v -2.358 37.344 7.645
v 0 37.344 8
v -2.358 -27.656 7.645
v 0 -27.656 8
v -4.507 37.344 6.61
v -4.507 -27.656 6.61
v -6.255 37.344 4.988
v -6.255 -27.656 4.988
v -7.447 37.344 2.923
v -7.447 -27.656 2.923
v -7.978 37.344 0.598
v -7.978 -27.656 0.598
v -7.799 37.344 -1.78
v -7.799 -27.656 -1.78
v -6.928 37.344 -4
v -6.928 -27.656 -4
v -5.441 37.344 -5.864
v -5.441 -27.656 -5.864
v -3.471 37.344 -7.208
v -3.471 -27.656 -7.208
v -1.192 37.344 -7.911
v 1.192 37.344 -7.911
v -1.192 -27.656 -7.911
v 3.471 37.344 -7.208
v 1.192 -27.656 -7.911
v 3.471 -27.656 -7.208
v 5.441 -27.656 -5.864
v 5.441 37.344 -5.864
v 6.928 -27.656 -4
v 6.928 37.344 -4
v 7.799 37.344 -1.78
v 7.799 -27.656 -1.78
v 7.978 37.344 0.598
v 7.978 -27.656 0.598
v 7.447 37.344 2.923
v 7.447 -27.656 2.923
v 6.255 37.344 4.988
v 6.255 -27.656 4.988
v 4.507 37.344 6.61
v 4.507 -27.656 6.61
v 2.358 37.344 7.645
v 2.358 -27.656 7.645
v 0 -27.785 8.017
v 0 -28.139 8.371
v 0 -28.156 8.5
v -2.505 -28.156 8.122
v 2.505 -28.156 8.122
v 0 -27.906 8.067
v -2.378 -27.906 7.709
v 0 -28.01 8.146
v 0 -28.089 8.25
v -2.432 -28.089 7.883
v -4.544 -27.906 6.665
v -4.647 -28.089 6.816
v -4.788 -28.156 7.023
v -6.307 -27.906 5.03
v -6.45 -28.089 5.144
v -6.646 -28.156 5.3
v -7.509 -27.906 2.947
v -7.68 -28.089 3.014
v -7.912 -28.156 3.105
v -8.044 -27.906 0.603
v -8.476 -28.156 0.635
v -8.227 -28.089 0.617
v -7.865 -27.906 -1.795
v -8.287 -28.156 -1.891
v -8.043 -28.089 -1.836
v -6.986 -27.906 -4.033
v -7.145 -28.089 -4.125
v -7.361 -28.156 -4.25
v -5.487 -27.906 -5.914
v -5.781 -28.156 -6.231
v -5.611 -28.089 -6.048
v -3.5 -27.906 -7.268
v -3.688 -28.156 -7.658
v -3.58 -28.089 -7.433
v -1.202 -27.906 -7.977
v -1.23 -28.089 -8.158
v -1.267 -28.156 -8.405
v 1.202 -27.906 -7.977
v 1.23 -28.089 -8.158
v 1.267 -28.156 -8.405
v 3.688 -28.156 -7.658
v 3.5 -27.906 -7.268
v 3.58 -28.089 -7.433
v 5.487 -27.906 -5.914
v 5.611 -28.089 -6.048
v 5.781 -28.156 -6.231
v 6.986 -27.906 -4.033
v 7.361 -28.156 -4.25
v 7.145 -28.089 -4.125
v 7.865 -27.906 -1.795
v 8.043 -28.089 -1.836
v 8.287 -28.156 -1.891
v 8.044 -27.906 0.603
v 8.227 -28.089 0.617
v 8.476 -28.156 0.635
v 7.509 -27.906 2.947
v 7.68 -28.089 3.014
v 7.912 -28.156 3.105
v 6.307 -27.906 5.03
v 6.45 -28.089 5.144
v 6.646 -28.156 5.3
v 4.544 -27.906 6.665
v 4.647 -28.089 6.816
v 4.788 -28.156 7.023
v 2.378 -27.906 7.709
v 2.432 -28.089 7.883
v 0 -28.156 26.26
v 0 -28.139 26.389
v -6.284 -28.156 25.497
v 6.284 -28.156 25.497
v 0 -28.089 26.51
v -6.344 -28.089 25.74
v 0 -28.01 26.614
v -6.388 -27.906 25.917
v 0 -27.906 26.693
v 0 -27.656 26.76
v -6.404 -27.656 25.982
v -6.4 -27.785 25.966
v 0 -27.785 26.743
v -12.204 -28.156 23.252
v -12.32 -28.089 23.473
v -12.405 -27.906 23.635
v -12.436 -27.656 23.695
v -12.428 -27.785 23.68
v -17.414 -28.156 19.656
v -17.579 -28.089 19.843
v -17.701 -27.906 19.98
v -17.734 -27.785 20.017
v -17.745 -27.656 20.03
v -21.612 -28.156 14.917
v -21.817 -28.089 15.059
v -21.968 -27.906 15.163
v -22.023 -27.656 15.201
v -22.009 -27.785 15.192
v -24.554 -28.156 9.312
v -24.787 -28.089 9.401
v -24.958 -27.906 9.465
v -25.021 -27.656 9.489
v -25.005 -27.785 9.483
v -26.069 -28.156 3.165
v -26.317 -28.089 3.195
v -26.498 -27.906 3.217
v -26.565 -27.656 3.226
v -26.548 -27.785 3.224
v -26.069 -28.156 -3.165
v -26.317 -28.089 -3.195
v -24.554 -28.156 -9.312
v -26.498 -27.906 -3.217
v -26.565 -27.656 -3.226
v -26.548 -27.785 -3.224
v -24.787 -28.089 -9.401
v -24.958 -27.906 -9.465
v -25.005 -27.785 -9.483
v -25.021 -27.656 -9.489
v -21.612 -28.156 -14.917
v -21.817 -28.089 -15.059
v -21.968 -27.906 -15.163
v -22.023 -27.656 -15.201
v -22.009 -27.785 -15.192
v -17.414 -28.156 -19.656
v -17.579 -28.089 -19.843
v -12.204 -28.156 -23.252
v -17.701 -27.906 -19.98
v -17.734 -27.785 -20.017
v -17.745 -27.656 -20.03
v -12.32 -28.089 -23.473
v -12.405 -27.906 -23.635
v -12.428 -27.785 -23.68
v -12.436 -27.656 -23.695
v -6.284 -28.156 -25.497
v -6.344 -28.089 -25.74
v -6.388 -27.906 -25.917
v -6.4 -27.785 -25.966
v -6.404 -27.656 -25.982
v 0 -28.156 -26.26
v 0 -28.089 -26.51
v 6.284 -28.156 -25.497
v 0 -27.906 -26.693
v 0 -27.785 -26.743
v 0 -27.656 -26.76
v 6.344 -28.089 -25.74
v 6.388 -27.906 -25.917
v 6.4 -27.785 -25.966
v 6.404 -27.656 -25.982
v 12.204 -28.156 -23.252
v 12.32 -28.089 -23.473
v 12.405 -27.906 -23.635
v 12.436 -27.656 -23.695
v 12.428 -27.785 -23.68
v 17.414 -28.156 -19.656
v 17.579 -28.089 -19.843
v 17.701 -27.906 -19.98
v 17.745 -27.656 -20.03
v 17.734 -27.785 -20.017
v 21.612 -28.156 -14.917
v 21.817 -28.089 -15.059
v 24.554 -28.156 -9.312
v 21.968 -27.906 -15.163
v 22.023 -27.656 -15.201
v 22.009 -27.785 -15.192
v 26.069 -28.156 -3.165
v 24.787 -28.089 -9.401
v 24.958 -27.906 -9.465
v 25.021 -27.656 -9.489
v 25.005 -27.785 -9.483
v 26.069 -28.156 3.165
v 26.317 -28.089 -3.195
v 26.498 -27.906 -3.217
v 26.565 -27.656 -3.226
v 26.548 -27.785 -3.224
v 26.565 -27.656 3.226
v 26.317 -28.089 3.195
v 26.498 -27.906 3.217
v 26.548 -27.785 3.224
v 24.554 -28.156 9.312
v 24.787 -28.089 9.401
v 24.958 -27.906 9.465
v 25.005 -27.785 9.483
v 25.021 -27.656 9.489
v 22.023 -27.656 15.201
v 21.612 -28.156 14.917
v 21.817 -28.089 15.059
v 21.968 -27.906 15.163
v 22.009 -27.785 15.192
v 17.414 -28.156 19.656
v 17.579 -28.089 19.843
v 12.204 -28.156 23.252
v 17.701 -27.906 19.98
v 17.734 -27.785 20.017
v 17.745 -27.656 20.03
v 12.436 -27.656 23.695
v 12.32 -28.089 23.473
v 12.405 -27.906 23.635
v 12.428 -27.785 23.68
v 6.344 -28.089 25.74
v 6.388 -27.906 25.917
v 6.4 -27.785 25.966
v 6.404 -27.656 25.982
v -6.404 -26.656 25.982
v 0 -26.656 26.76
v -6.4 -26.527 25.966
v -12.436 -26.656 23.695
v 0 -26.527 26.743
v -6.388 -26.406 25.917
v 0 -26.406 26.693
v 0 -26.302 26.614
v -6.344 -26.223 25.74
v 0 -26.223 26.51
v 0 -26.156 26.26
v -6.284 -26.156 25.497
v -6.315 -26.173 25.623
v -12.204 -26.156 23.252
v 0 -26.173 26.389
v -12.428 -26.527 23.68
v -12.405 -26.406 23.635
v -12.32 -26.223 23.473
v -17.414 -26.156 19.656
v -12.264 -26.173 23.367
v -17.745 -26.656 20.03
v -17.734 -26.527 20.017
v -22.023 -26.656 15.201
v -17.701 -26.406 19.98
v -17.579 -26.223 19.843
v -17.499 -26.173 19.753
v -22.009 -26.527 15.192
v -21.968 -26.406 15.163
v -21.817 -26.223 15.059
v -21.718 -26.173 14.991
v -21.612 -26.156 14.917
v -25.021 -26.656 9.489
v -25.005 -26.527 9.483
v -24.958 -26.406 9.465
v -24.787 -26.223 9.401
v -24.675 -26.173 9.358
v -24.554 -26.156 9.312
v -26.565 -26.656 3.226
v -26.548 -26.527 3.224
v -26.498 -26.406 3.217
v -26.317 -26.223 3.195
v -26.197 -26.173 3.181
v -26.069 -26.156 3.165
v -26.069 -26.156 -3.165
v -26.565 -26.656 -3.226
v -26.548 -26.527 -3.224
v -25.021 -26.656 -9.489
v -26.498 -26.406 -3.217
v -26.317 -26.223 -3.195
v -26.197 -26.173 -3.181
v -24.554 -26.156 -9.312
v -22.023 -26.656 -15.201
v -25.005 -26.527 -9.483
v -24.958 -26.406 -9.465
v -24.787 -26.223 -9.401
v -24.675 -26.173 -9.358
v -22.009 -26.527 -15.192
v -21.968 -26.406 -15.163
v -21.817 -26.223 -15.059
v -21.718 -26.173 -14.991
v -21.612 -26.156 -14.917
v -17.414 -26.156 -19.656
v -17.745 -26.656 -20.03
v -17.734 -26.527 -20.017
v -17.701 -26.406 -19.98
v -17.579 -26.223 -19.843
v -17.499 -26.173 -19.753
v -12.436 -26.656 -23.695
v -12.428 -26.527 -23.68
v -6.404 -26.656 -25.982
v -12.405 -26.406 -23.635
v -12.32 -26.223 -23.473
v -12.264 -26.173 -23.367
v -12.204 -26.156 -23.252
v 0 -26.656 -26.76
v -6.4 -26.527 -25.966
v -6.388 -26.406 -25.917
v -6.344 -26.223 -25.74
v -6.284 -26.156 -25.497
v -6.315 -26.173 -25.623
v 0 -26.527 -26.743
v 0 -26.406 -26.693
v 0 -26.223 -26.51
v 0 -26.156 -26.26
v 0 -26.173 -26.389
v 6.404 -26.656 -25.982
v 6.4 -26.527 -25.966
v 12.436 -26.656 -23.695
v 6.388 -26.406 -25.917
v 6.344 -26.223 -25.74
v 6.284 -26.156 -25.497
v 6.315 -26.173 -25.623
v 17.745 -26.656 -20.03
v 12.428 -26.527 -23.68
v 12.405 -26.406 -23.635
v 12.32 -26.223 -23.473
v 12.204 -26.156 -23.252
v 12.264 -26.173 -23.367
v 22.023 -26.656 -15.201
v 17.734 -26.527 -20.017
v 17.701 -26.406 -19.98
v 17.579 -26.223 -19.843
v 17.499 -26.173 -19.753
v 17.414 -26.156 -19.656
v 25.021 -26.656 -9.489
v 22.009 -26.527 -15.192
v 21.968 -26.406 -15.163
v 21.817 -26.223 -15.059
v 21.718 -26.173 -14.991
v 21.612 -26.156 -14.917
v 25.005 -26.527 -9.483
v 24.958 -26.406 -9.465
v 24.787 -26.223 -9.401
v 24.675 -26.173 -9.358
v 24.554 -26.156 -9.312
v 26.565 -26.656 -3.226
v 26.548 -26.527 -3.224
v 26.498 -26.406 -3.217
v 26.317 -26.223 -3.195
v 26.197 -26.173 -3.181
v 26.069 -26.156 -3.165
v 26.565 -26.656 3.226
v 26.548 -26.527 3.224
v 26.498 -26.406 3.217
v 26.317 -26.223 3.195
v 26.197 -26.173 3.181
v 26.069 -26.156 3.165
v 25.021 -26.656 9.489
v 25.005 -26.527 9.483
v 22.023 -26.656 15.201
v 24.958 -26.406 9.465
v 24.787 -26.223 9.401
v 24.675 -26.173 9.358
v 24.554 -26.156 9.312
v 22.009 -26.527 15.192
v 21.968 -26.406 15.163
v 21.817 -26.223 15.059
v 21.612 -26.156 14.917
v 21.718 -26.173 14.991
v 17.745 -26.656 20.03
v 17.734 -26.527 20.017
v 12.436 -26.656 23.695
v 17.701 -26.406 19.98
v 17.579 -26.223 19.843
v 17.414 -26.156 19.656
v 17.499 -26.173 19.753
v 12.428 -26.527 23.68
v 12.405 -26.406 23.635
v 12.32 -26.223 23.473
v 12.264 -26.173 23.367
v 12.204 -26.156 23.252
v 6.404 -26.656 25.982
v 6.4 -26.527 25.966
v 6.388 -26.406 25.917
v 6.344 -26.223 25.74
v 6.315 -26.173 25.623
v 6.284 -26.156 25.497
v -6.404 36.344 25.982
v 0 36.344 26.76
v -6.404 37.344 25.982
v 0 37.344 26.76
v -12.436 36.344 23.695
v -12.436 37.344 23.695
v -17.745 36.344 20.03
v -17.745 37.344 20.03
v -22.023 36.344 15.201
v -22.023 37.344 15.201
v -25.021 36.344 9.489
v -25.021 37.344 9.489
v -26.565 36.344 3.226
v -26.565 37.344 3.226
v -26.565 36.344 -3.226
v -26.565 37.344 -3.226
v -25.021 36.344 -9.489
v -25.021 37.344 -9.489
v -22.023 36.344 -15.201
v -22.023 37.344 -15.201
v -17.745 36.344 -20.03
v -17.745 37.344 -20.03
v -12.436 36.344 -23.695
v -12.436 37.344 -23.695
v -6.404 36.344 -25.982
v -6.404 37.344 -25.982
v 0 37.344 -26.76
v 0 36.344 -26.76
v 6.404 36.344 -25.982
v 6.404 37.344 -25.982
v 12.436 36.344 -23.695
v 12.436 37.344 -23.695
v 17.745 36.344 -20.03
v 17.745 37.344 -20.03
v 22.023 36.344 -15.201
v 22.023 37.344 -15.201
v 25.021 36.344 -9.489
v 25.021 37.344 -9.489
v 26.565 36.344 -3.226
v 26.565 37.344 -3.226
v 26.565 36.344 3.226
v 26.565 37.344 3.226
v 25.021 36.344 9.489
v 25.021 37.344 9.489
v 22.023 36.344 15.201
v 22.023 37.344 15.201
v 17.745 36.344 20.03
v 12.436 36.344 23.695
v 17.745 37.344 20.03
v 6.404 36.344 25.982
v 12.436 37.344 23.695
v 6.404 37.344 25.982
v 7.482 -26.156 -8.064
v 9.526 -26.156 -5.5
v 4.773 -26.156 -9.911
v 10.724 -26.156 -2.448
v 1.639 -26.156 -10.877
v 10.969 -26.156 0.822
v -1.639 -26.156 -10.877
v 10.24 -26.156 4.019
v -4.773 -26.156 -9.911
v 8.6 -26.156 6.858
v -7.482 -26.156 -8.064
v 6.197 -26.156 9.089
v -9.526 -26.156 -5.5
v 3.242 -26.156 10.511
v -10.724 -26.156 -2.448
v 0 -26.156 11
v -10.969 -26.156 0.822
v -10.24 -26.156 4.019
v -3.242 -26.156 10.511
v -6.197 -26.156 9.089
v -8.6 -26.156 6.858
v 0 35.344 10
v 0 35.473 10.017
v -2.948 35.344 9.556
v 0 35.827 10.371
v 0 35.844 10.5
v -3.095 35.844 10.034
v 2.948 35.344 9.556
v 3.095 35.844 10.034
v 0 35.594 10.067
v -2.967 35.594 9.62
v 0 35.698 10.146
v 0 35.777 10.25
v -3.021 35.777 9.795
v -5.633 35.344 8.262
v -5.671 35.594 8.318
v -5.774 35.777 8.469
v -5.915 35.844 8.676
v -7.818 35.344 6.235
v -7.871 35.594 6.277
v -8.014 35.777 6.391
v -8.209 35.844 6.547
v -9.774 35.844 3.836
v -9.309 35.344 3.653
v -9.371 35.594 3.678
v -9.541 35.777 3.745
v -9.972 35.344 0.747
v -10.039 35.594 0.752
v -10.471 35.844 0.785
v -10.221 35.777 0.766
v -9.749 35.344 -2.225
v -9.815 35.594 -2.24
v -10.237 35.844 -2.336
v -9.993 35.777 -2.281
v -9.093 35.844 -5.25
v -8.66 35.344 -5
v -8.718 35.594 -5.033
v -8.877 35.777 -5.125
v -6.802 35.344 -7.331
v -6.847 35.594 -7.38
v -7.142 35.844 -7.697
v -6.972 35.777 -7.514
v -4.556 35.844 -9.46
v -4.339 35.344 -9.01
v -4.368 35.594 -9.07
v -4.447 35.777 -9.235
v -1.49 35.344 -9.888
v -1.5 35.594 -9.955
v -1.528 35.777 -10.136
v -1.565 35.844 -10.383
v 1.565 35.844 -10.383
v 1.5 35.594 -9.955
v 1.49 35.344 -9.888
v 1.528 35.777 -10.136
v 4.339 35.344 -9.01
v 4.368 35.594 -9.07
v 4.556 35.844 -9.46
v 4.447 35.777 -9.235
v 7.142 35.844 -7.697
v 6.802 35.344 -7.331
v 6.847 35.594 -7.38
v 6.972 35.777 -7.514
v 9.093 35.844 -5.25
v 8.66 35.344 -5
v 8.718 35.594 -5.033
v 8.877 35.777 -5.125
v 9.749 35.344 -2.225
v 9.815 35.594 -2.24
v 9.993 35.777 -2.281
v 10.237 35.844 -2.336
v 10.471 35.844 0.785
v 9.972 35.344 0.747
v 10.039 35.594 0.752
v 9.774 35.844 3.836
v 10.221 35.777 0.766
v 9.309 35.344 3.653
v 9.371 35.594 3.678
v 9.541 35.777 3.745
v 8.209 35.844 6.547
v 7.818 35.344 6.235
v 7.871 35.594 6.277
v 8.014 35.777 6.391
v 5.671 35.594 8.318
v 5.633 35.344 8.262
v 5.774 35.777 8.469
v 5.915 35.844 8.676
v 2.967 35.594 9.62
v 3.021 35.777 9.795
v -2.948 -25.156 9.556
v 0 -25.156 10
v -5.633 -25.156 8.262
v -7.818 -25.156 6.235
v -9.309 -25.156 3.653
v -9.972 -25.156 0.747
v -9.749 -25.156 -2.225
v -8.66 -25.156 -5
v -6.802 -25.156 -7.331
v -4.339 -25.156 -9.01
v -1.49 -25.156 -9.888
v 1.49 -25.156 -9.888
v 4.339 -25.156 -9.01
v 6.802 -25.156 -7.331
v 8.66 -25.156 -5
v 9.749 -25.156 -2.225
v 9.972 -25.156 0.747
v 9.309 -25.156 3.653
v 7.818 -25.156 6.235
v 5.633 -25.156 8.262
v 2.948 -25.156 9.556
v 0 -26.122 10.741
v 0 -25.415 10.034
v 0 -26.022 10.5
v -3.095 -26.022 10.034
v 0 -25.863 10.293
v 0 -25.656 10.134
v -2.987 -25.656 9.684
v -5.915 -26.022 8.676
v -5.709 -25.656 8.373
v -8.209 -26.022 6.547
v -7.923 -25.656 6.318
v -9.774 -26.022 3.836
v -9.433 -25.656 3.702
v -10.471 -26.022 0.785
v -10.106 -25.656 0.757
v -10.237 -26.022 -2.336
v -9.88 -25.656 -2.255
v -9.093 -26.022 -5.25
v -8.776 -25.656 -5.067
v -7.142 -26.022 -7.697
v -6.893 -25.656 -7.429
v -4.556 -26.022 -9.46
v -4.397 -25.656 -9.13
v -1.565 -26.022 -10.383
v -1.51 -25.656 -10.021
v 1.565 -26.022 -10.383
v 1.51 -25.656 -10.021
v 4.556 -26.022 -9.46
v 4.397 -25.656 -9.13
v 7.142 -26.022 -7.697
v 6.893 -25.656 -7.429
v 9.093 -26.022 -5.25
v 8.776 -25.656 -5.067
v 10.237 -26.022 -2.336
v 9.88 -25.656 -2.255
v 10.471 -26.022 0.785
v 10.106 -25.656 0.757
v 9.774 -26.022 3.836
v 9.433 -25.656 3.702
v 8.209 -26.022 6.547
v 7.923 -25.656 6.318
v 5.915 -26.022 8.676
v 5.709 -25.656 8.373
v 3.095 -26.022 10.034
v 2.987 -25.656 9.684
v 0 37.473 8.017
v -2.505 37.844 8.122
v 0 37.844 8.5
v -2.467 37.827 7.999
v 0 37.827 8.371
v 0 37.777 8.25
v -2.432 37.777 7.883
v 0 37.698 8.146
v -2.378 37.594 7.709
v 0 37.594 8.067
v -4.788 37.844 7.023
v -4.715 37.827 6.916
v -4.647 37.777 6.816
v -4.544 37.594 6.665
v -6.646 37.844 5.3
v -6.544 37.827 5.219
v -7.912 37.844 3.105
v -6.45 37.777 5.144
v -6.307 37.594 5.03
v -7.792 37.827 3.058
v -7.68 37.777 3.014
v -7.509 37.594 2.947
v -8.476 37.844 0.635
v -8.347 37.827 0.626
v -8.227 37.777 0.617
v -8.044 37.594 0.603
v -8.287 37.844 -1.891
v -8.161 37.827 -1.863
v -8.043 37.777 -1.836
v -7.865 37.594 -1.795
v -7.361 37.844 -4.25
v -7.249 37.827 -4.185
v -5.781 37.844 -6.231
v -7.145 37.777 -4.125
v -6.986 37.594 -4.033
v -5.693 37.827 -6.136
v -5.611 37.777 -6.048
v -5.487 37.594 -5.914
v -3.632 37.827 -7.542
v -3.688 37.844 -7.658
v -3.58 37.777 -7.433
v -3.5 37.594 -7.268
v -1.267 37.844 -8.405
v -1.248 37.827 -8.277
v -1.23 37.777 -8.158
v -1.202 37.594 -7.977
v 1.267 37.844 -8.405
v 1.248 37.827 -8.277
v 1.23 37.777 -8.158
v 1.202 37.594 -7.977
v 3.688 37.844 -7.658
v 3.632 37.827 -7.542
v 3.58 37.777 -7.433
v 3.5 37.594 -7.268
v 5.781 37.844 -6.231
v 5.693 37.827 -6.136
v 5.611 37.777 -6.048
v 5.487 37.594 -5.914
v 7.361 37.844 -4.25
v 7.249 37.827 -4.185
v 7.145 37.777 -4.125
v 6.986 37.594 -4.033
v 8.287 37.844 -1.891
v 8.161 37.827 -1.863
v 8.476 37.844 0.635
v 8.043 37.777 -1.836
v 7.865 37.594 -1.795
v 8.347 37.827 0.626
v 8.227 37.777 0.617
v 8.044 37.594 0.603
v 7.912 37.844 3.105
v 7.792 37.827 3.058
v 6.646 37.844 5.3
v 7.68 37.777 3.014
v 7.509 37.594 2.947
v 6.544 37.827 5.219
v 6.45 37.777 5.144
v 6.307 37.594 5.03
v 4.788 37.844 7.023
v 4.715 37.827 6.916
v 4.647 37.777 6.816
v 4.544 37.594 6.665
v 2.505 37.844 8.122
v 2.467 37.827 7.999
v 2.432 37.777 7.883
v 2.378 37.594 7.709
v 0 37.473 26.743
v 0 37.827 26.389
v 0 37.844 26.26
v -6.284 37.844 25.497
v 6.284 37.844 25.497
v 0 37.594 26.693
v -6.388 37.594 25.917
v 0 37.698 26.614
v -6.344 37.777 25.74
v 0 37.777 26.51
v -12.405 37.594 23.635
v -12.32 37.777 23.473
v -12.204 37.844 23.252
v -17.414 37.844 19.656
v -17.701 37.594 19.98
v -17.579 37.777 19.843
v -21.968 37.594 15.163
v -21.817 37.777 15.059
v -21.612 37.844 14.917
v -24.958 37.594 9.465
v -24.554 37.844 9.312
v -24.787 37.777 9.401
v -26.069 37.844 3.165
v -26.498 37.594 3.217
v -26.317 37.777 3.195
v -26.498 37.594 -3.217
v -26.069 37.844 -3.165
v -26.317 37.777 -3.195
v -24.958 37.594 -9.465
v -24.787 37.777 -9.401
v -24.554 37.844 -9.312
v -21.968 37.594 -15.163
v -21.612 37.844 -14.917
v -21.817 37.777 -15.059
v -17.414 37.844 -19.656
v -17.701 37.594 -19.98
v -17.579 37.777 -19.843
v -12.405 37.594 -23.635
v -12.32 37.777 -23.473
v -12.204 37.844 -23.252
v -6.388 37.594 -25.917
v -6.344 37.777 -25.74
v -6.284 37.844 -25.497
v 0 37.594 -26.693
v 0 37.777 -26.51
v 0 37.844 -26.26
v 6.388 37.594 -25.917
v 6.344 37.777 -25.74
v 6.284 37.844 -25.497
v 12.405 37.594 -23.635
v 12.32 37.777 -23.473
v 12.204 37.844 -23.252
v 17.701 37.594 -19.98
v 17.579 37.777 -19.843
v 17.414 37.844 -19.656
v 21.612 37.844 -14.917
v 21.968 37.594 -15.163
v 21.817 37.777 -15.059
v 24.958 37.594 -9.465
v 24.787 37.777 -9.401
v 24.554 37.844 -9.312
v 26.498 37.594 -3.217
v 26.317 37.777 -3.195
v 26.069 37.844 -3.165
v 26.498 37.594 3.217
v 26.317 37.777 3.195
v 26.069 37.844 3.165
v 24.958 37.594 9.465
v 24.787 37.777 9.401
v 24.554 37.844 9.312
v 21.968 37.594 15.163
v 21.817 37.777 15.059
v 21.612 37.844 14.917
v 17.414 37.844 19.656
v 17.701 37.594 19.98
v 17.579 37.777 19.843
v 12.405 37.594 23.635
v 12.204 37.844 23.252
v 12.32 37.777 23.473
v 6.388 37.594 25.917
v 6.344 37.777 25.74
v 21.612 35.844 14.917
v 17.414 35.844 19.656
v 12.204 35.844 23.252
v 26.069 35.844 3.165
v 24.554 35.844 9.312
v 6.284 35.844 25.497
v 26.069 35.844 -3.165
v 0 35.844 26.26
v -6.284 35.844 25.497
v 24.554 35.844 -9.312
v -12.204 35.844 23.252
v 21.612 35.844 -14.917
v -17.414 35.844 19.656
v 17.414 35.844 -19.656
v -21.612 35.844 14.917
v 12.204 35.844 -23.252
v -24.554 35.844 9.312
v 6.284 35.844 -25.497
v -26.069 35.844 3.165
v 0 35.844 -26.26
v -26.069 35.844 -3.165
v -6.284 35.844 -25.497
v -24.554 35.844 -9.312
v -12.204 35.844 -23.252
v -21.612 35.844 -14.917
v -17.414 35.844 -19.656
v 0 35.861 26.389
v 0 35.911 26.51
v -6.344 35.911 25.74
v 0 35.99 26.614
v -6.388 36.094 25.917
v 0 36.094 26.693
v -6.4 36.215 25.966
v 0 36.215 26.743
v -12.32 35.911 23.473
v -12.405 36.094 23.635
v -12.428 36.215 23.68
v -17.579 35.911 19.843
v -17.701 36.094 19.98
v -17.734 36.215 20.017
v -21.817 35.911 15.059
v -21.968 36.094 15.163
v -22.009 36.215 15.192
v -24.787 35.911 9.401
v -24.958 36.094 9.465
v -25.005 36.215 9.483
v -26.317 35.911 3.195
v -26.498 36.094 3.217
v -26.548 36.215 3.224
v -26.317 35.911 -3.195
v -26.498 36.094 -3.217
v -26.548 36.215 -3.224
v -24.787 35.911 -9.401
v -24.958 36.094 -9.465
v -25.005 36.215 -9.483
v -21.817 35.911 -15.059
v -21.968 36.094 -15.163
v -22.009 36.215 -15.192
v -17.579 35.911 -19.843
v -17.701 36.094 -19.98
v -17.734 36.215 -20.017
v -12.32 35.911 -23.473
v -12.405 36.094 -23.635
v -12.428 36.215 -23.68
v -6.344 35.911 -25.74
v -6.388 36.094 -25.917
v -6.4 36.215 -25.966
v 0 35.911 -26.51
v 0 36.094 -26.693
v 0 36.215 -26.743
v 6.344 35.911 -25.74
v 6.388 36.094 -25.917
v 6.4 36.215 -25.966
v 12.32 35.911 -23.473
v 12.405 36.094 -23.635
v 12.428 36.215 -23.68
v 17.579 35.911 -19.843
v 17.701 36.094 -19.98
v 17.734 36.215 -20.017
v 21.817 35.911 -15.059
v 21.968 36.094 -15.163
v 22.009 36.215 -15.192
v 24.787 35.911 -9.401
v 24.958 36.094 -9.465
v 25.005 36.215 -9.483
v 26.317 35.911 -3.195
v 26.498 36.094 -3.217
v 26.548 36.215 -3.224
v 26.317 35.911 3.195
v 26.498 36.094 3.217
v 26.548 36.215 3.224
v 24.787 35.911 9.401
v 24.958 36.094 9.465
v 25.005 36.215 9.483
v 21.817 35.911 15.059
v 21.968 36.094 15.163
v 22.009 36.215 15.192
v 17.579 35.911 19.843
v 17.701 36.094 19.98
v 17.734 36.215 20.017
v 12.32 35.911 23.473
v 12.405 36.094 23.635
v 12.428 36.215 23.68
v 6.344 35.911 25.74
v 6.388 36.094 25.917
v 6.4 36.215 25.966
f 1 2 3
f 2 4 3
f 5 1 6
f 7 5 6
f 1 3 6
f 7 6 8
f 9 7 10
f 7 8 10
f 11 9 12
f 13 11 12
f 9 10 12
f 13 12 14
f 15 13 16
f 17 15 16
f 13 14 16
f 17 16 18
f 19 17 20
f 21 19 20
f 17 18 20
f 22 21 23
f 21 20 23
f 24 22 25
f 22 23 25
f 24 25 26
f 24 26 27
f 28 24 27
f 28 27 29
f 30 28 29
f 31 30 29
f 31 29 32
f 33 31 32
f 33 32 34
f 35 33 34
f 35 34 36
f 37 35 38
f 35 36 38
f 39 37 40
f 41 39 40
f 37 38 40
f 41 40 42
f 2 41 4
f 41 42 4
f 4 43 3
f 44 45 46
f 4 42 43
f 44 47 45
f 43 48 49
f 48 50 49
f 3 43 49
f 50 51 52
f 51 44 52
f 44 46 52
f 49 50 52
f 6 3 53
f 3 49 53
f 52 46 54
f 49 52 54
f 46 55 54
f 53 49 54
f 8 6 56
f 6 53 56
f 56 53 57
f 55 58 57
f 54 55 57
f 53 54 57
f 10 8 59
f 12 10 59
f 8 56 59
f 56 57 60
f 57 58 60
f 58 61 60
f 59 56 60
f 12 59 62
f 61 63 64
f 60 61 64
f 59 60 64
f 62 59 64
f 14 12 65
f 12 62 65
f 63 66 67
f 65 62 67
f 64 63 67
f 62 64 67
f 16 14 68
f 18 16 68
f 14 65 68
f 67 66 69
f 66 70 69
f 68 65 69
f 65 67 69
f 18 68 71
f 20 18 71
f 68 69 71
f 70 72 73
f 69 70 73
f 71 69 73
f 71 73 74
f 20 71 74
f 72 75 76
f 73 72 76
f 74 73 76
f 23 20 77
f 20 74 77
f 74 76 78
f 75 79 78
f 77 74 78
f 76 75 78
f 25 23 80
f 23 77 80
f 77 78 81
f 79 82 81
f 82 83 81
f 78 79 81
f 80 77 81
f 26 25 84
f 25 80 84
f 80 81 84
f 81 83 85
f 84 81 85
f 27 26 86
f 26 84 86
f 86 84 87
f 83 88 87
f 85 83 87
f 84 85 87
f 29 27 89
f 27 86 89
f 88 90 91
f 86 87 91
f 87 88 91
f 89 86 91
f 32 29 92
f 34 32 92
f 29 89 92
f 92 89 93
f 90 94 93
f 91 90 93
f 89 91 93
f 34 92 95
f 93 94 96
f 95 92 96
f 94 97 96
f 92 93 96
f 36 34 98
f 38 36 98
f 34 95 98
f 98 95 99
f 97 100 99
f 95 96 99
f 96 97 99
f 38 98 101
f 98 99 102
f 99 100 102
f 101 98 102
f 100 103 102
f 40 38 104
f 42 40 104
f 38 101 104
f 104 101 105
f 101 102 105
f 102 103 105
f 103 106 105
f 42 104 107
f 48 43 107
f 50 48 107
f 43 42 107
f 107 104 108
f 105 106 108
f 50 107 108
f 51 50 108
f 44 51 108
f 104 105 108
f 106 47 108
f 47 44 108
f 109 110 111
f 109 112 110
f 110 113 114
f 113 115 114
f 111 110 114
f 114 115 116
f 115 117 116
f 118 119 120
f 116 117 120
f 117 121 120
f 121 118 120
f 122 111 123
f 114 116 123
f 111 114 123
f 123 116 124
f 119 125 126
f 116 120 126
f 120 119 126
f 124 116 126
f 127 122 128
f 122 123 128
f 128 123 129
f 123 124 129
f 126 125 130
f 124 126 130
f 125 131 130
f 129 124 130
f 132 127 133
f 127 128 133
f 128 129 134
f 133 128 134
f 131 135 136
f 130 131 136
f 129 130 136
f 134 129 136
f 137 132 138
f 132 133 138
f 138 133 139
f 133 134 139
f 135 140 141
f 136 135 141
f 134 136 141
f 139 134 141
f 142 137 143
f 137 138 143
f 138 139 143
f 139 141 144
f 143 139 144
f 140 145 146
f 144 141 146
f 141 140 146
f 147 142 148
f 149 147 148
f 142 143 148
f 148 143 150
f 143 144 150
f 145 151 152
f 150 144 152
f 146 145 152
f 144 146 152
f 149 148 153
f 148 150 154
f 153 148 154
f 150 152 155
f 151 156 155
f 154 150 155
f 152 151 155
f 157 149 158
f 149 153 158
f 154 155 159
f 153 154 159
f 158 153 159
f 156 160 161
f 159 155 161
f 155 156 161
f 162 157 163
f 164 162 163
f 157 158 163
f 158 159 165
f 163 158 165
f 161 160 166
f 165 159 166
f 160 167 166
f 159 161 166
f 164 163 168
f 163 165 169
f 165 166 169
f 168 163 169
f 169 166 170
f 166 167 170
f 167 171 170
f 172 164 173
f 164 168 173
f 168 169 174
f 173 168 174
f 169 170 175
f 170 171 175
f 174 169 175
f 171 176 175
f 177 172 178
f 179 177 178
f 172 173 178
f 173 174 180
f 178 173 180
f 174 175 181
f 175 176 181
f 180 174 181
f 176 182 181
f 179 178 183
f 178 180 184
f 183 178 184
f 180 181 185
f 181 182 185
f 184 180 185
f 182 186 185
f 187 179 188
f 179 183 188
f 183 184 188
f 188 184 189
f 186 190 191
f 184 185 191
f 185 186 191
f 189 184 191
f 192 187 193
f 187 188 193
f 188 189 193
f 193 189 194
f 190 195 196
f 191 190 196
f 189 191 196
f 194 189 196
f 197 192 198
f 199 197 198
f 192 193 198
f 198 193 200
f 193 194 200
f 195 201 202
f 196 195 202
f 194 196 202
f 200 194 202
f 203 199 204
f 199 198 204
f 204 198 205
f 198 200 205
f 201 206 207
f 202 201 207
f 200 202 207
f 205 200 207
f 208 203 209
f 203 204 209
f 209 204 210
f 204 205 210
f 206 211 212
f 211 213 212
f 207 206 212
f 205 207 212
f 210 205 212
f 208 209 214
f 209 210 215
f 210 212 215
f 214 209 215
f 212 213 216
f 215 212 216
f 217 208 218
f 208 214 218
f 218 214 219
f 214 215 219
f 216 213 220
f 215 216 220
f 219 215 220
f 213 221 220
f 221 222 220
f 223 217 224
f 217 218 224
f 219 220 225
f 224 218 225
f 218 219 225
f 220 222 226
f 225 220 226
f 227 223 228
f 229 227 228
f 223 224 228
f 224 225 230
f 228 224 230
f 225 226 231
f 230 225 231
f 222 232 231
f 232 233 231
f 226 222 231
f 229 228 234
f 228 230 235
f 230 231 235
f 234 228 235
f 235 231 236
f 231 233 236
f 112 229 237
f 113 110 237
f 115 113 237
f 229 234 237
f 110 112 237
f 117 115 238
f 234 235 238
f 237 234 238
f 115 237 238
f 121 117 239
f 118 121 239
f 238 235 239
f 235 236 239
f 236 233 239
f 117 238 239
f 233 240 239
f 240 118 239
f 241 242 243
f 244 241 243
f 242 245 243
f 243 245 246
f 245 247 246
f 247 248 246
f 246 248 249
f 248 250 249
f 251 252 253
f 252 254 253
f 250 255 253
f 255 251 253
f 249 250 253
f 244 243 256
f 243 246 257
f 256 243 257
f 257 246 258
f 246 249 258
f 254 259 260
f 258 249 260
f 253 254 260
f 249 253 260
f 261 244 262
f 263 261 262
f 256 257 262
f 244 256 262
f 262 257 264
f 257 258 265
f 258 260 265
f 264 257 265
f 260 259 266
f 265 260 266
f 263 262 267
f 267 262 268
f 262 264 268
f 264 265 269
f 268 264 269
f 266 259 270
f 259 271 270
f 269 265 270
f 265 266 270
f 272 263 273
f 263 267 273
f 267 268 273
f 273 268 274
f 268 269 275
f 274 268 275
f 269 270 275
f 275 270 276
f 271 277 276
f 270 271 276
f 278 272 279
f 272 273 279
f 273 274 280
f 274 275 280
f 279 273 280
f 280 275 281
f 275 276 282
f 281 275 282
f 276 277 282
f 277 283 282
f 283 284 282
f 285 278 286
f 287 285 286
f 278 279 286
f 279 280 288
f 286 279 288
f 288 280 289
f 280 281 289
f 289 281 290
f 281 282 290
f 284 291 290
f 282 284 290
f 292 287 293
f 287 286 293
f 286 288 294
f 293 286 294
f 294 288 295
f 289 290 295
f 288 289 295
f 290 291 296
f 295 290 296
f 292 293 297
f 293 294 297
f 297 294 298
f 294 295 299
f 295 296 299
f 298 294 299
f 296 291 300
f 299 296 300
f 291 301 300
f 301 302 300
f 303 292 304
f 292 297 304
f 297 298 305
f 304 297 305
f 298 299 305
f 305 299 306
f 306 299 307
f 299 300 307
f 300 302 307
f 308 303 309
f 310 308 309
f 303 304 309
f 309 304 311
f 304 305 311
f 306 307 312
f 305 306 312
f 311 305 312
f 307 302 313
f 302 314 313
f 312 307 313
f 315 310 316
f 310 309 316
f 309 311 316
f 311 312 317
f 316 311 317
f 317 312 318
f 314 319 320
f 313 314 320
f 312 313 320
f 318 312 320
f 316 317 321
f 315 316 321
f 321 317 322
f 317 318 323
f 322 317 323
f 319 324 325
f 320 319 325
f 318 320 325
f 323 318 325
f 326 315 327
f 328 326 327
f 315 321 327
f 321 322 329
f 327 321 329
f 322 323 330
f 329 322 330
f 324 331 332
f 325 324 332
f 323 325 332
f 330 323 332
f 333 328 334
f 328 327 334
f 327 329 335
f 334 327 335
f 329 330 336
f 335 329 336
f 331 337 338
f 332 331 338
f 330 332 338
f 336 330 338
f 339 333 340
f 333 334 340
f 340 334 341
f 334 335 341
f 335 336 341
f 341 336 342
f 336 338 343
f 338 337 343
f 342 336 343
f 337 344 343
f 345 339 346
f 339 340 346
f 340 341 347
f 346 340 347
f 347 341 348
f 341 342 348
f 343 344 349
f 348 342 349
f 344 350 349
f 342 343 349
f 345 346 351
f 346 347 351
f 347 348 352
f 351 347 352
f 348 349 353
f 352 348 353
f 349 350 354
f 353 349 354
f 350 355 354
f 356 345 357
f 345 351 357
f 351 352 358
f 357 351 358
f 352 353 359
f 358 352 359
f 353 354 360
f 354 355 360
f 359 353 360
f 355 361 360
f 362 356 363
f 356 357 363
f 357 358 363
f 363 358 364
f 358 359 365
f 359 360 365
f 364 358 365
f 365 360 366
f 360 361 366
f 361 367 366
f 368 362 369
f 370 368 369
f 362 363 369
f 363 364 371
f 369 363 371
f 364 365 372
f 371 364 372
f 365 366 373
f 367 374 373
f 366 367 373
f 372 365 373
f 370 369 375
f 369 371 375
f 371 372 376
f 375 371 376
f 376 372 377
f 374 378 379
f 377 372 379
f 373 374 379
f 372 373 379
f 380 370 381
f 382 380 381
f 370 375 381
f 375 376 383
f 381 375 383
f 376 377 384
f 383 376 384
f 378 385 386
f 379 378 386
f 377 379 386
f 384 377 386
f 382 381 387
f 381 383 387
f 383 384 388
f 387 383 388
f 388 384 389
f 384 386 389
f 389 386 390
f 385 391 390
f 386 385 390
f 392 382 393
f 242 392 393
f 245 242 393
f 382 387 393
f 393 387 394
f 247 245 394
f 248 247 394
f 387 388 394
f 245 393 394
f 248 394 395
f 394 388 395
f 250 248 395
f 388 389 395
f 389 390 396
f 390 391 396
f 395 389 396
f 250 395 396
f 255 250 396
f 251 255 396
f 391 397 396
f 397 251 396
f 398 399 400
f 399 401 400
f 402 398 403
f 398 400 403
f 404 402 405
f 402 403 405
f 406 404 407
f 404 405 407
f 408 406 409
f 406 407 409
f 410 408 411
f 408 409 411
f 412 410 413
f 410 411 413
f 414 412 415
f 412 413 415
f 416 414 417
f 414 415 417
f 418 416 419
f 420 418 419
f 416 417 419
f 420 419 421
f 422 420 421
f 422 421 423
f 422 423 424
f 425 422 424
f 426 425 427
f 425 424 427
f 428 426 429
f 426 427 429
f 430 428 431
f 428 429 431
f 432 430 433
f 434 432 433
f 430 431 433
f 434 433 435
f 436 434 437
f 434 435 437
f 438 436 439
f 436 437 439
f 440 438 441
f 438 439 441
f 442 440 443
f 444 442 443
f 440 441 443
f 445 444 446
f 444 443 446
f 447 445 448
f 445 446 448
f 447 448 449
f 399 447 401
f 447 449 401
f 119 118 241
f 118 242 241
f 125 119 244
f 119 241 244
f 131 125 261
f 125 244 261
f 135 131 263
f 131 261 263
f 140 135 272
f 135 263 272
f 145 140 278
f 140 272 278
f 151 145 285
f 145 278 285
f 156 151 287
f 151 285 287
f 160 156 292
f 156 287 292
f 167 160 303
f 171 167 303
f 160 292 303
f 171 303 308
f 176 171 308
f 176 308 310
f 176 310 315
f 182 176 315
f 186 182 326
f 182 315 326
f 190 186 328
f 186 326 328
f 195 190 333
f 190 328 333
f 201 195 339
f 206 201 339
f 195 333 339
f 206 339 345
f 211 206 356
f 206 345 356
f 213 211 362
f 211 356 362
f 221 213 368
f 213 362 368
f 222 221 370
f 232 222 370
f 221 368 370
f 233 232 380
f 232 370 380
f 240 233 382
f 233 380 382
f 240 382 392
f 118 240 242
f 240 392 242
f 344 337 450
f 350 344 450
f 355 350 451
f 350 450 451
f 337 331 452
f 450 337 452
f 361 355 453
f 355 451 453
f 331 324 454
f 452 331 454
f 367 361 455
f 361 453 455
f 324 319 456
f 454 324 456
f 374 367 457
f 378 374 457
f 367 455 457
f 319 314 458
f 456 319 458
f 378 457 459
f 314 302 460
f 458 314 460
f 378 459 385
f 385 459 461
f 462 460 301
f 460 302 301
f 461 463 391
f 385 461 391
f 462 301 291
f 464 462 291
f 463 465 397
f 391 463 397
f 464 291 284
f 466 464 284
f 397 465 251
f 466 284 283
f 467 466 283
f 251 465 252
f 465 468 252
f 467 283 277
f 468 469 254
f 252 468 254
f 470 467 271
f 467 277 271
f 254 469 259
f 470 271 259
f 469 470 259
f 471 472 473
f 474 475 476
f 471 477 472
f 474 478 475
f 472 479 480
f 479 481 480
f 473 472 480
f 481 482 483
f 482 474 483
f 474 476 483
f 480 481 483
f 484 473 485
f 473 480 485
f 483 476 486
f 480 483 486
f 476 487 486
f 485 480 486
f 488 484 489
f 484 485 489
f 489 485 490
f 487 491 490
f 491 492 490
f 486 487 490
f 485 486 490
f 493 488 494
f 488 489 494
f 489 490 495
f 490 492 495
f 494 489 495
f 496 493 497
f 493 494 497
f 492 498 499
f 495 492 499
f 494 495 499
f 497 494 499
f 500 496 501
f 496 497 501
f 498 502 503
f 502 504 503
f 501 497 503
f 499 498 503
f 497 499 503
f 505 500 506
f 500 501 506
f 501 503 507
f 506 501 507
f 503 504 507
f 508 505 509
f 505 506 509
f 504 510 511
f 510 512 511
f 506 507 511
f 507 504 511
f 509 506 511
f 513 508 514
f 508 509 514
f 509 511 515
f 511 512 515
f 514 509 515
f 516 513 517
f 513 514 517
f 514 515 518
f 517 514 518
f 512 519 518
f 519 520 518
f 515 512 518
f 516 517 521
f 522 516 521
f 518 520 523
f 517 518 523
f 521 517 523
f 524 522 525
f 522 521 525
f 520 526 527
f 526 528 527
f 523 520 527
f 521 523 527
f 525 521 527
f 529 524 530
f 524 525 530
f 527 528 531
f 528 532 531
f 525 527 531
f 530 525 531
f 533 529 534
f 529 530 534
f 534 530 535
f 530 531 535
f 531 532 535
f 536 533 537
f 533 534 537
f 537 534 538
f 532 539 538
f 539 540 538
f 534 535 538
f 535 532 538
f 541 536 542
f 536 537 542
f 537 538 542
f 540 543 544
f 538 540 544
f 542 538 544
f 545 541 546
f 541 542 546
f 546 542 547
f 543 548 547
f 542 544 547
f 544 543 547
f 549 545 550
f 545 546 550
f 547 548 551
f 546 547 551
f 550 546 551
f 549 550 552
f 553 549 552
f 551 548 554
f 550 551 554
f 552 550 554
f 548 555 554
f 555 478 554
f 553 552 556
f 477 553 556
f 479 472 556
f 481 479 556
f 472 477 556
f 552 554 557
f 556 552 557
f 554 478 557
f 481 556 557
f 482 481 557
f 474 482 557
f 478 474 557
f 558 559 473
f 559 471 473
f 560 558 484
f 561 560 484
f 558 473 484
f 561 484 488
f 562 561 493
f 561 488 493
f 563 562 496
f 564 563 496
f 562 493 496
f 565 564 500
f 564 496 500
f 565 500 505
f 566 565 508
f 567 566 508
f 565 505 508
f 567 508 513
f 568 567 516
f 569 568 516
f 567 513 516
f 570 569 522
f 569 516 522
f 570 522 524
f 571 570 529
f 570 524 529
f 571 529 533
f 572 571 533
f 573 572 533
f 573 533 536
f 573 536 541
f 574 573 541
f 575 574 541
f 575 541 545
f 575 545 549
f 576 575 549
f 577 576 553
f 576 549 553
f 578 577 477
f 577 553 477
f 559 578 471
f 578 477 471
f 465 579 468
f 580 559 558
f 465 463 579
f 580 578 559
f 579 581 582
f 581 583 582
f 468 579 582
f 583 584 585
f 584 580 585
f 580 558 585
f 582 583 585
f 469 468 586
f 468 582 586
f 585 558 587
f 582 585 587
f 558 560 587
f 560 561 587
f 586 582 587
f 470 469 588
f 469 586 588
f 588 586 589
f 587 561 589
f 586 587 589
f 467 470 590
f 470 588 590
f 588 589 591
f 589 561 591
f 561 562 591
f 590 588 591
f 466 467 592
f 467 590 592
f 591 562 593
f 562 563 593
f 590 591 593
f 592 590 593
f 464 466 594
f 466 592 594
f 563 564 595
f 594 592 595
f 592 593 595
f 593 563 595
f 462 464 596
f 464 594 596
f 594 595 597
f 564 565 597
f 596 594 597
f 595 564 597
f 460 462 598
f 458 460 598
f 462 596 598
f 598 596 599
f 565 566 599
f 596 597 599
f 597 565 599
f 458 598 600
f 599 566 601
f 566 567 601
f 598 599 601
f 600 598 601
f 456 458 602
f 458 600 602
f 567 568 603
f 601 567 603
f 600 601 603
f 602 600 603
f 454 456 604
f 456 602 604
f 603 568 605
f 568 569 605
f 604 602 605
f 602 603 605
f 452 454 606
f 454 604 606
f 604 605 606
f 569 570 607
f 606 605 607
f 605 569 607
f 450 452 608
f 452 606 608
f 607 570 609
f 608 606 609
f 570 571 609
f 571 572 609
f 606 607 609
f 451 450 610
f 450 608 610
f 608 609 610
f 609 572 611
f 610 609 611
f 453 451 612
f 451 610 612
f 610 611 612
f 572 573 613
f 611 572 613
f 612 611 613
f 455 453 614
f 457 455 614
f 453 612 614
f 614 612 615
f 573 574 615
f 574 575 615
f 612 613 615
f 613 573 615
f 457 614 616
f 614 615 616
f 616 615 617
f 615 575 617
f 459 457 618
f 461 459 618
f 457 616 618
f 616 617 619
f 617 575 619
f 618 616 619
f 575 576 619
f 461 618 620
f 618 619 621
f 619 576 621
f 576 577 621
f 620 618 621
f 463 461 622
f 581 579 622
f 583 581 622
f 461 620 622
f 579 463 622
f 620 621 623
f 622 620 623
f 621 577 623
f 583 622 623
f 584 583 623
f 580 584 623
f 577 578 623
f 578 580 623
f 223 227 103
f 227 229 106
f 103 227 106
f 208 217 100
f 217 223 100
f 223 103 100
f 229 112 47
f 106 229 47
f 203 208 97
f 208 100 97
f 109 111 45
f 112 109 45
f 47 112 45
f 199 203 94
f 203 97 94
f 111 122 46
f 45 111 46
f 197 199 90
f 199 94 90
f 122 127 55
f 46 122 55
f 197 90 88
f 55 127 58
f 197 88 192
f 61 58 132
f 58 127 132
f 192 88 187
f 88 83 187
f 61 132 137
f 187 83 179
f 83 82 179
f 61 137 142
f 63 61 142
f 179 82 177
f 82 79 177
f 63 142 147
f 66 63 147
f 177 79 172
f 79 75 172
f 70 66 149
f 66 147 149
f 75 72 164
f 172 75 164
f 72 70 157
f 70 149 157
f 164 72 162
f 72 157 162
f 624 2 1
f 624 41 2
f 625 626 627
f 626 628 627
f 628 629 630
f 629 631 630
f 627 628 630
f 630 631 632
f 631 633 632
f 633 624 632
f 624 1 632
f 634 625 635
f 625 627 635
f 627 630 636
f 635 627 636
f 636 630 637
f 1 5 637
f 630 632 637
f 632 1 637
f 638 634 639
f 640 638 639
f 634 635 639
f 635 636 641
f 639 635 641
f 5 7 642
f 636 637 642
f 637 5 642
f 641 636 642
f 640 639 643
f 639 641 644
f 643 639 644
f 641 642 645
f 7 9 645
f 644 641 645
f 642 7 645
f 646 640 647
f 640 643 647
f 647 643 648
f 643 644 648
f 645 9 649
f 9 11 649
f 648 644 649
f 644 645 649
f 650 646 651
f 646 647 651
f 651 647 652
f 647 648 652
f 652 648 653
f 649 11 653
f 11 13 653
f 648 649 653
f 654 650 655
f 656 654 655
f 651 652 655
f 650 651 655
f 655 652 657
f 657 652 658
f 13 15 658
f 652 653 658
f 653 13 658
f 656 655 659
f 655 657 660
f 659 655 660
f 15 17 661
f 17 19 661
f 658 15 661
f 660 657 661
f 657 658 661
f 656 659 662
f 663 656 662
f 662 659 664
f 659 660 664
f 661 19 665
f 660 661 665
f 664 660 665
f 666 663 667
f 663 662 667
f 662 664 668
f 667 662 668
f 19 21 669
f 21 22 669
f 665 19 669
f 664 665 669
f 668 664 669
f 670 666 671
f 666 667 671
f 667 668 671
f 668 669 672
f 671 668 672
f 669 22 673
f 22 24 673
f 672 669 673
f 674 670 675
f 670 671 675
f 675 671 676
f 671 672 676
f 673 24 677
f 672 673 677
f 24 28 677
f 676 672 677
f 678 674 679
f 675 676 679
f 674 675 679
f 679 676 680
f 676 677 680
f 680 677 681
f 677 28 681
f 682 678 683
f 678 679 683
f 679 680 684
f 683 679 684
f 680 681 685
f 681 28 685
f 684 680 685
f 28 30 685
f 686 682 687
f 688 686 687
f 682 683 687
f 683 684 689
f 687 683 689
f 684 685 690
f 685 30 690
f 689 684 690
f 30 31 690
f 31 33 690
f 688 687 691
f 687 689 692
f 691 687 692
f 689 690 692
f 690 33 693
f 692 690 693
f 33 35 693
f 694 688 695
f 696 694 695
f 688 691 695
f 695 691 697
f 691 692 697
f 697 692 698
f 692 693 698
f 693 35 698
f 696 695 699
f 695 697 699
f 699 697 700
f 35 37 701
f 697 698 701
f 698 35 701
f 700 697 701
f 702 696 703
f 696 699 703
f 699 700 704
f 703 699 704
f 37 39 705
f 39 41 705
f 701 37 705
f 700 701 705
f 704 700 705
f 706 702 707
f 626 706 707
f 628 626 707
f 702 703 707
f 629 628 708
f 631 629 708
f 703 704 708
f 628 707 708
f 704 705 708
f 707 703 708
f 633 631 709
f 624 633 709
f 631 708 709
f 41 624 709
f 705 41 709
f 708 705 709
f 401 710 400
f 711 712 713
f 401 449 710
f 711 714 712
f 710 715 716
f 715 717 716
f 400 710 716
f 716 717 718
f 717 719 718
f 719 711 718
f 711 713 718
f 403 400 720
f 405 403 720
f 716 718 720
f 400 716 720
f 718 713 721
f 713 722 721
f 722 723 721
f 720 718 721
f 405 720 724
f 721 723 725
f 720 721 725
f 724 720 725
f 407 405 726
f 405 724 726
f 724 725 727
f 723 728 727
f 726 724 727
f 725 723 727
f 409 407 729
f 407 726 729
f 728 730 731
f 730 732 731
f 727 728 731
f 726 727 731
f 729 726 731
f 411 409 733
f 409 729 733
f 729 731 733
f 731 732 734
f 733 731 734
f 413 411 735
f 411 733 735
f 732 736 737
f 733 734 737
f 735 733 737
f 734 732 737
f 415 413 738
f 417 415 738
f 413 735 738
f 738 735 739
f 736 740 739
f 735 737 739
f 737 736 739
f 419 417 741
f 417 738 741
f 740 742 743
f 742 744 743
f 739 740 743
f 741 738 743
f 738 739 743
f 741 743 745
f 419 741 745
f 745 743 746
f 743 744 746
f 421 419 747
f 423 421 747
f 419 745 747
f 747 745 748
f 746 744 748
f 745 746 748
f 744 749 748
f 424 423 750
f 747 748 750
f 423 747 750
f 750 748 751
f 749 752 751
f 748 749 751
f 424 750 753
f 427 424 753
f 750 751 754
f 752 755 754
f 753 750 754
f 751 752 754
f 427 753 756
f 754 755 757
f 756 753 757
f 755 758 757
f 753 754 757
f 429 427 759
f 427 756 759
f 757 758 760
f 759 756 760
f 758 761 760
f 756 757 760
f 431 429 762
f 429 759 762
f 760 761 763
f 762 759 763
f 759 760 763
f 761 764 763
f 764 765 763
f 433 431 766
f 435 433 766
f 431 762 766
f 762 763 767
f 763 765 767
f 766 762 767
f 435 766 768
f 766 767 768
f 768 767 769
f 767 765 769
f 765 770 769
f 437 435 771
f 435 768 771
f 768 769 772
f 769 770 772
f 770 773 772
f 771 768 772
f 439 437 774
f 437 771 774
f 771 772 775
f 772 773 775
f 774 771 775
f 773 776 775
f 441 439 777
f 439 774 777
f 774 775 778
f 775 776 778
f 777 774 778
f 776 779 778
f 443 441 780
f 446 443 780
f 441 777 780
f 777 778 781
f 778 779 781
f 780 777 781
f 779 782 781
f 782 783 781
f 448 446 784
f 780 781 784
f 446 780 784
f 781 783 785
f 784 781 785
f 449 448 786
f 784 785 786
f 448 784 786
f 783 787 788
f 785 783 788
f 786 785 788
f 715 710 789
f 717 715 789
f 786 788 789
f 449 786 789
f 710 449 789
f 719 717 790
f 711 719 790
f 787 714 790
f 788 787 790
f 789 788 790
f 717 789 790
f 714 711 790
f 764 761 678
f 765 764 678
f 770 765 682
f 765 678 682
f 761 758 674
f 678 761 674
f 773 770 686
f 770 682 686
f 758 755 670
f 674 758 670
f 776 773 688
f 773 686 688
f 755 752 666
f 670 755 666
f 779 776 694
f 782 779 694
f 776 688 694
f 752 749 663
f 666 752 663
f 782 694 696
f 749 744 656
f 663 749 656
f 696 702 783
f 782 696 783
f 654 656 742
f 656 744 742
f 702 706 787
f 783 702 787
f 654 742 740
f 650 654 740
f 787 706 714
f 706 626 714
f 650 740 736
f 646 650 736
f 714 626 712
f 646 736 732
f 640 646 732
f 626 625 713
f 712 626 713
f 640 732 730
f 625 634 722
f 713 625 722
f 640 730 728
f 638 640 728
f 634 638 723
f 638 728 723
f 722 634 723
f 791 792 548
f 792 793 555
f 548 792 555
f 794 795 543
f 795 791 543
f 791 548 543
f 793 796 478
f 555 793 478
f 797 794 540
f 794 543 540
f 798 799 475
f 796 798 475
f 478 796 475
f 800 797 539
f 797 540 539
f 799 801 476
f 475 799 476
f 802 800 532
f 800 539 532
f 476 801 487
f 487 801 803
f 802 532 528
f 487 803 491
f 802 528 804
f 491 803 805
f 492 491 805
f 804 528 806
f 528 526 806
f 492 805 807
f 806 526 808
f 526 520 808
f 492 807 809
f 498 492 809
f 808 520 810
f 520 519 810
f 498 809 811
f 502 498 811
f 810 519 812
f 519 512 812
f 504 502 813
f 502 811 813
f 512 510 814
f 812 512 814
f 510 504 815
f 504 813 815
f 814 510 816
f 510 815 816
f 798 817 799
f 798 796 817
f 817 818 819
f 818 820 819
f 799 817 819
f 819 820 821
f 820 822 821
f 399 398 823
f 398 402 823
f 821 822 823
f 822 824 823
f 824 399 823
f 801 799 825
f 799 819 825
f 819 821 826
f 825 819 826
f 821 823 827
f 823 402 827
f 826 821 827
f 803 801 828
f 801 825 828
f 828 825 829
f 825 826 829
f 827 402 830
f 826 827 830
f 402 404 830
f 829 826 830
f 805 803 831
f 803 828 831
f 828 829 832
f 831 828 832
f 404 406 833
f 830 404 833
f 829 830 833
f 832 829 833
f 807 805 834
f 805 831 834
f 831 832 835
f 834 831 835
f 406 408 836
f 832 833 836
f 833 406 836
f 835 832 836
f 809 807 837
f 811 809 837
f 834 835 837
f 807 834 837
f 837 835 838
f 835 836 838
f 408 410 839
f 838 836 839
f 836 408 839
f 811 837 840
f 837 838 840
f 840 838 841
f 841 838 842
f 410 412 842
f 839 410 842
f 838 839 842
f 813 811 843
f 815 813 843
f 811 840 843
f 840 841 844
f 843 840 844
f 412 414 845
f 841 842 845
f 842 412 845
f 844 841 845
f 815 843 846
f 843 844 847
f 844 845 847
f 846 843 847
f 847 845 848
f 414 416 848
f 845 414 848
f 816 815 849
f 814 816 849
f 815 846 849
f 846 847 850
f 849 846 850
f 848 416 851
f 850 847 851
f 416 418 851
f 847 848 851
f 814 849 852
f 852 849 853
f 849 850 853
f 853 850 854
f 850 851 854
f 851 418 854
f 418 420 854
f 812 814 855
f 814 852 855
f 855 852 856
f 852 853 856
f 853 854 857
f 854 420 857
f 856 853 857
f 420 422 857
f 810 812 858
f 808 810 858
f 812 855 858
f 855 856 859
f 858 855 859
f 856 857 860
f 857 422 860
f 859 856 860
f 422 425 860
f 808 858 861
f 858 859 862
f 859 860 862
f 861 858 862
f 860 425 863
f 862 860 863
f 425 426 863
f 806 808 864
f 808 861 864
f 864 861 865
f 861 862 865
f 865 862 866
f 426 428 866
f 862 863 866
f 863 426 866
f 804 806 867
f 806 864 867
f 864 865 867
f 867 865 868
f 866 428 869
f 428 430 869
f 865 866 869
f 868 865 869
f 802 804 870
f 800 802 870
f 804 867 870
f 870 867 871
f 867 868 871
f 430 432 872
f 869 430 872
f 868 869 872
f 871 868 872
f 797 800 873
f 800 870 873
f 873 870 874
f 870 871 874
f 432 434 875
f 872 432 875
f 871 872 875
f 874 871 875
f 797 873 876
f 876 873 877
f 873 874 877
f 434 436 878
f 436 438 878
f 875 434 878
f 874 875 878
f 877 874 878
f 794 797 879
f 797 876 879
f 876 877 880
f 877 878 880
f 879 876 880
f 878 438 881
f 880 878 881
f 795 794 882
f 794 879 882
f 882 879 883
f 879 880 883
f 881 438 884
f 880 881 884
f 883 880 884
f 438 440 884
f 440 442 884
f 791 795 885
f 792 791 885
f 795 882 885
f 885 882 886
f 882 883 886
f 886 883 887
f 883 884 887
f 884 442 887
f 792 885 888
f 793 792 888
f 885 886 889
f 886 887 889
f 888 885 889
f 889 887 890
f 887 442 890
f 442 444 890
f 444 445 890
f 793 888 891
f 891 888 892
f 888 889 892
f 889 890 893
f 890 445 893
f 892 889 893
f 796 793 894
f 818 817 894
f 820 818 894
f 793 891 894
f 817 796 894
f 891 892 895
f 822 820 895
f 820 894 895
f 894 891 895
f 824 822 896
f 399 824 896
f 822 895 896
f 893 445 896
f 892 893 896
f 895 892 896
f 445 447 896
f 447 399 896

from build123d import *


with BuildPart() as part:
    # Croquis1 → Revolución1 (revolve)
    with BuildSketch(Plane.XY, mode=Mode.PRIVATE) as revoluci_n1_sk:
        with BuildLine():
            Line((8, 37.343958304), (8, -27.656041696))
            ThreePointArc((8, -27.656041696), (8.146446609, -28.009595087), (8.5, -28.156041696))
            Line((8.5, -28.156041696), (26.26, -28.156041696))
            ThreePointArc((26.26, -28.156041696), (26.613553391, -28.009595087), (26.76, -27.656041696))
            Line((26.76, -27.656041696), (26.76, -26.656041696))
            ThreePointArc((26.76, -26.656041696), (26.613553391, -26.302488306), (26.26, -26.156041696))
            Line((26.26, -26.156041696), (11, -26.156041696))
            ThreePointArc((11, -26.156041696), (10.292893219, -25.863148478), (10, -25.156041696))
            Line((10, -25.156041696), (10, 35.343958304))
            ThreePointArc((10, 35.343958304), (10.146446609, 35.697511694), (10.5, 35.843958304))
            Line((10.5, 35.843958304), (26.26, 35.843958304))
            ThreePointArc((26.26, 35.843958304), (26.613553391, 35.990404913), (26.76, 36.343958304))
            Line((26.76, 36.343958304), (26.76, 37.343958304))
            ThreePointArc((26.76, 37.343958304), (26.613553391, 37.697511694), (26.26, 37.843958304))
            Line((26.26, 37.843958304), (8.5, 37.843958304))
            ThreePointArc((8.5, 37.843958304), (8.146446609, 37.697511694), (8, 37.343958304))
        make_face()
    revolve(revoluci_n1_sk.sketch.rotate(Axis((0, 20.974210771, 0), (0, -1, 0)), 90), axis=Axis((0, 20.974210771, 0), (0, -1, 0)))


solid = part.part
